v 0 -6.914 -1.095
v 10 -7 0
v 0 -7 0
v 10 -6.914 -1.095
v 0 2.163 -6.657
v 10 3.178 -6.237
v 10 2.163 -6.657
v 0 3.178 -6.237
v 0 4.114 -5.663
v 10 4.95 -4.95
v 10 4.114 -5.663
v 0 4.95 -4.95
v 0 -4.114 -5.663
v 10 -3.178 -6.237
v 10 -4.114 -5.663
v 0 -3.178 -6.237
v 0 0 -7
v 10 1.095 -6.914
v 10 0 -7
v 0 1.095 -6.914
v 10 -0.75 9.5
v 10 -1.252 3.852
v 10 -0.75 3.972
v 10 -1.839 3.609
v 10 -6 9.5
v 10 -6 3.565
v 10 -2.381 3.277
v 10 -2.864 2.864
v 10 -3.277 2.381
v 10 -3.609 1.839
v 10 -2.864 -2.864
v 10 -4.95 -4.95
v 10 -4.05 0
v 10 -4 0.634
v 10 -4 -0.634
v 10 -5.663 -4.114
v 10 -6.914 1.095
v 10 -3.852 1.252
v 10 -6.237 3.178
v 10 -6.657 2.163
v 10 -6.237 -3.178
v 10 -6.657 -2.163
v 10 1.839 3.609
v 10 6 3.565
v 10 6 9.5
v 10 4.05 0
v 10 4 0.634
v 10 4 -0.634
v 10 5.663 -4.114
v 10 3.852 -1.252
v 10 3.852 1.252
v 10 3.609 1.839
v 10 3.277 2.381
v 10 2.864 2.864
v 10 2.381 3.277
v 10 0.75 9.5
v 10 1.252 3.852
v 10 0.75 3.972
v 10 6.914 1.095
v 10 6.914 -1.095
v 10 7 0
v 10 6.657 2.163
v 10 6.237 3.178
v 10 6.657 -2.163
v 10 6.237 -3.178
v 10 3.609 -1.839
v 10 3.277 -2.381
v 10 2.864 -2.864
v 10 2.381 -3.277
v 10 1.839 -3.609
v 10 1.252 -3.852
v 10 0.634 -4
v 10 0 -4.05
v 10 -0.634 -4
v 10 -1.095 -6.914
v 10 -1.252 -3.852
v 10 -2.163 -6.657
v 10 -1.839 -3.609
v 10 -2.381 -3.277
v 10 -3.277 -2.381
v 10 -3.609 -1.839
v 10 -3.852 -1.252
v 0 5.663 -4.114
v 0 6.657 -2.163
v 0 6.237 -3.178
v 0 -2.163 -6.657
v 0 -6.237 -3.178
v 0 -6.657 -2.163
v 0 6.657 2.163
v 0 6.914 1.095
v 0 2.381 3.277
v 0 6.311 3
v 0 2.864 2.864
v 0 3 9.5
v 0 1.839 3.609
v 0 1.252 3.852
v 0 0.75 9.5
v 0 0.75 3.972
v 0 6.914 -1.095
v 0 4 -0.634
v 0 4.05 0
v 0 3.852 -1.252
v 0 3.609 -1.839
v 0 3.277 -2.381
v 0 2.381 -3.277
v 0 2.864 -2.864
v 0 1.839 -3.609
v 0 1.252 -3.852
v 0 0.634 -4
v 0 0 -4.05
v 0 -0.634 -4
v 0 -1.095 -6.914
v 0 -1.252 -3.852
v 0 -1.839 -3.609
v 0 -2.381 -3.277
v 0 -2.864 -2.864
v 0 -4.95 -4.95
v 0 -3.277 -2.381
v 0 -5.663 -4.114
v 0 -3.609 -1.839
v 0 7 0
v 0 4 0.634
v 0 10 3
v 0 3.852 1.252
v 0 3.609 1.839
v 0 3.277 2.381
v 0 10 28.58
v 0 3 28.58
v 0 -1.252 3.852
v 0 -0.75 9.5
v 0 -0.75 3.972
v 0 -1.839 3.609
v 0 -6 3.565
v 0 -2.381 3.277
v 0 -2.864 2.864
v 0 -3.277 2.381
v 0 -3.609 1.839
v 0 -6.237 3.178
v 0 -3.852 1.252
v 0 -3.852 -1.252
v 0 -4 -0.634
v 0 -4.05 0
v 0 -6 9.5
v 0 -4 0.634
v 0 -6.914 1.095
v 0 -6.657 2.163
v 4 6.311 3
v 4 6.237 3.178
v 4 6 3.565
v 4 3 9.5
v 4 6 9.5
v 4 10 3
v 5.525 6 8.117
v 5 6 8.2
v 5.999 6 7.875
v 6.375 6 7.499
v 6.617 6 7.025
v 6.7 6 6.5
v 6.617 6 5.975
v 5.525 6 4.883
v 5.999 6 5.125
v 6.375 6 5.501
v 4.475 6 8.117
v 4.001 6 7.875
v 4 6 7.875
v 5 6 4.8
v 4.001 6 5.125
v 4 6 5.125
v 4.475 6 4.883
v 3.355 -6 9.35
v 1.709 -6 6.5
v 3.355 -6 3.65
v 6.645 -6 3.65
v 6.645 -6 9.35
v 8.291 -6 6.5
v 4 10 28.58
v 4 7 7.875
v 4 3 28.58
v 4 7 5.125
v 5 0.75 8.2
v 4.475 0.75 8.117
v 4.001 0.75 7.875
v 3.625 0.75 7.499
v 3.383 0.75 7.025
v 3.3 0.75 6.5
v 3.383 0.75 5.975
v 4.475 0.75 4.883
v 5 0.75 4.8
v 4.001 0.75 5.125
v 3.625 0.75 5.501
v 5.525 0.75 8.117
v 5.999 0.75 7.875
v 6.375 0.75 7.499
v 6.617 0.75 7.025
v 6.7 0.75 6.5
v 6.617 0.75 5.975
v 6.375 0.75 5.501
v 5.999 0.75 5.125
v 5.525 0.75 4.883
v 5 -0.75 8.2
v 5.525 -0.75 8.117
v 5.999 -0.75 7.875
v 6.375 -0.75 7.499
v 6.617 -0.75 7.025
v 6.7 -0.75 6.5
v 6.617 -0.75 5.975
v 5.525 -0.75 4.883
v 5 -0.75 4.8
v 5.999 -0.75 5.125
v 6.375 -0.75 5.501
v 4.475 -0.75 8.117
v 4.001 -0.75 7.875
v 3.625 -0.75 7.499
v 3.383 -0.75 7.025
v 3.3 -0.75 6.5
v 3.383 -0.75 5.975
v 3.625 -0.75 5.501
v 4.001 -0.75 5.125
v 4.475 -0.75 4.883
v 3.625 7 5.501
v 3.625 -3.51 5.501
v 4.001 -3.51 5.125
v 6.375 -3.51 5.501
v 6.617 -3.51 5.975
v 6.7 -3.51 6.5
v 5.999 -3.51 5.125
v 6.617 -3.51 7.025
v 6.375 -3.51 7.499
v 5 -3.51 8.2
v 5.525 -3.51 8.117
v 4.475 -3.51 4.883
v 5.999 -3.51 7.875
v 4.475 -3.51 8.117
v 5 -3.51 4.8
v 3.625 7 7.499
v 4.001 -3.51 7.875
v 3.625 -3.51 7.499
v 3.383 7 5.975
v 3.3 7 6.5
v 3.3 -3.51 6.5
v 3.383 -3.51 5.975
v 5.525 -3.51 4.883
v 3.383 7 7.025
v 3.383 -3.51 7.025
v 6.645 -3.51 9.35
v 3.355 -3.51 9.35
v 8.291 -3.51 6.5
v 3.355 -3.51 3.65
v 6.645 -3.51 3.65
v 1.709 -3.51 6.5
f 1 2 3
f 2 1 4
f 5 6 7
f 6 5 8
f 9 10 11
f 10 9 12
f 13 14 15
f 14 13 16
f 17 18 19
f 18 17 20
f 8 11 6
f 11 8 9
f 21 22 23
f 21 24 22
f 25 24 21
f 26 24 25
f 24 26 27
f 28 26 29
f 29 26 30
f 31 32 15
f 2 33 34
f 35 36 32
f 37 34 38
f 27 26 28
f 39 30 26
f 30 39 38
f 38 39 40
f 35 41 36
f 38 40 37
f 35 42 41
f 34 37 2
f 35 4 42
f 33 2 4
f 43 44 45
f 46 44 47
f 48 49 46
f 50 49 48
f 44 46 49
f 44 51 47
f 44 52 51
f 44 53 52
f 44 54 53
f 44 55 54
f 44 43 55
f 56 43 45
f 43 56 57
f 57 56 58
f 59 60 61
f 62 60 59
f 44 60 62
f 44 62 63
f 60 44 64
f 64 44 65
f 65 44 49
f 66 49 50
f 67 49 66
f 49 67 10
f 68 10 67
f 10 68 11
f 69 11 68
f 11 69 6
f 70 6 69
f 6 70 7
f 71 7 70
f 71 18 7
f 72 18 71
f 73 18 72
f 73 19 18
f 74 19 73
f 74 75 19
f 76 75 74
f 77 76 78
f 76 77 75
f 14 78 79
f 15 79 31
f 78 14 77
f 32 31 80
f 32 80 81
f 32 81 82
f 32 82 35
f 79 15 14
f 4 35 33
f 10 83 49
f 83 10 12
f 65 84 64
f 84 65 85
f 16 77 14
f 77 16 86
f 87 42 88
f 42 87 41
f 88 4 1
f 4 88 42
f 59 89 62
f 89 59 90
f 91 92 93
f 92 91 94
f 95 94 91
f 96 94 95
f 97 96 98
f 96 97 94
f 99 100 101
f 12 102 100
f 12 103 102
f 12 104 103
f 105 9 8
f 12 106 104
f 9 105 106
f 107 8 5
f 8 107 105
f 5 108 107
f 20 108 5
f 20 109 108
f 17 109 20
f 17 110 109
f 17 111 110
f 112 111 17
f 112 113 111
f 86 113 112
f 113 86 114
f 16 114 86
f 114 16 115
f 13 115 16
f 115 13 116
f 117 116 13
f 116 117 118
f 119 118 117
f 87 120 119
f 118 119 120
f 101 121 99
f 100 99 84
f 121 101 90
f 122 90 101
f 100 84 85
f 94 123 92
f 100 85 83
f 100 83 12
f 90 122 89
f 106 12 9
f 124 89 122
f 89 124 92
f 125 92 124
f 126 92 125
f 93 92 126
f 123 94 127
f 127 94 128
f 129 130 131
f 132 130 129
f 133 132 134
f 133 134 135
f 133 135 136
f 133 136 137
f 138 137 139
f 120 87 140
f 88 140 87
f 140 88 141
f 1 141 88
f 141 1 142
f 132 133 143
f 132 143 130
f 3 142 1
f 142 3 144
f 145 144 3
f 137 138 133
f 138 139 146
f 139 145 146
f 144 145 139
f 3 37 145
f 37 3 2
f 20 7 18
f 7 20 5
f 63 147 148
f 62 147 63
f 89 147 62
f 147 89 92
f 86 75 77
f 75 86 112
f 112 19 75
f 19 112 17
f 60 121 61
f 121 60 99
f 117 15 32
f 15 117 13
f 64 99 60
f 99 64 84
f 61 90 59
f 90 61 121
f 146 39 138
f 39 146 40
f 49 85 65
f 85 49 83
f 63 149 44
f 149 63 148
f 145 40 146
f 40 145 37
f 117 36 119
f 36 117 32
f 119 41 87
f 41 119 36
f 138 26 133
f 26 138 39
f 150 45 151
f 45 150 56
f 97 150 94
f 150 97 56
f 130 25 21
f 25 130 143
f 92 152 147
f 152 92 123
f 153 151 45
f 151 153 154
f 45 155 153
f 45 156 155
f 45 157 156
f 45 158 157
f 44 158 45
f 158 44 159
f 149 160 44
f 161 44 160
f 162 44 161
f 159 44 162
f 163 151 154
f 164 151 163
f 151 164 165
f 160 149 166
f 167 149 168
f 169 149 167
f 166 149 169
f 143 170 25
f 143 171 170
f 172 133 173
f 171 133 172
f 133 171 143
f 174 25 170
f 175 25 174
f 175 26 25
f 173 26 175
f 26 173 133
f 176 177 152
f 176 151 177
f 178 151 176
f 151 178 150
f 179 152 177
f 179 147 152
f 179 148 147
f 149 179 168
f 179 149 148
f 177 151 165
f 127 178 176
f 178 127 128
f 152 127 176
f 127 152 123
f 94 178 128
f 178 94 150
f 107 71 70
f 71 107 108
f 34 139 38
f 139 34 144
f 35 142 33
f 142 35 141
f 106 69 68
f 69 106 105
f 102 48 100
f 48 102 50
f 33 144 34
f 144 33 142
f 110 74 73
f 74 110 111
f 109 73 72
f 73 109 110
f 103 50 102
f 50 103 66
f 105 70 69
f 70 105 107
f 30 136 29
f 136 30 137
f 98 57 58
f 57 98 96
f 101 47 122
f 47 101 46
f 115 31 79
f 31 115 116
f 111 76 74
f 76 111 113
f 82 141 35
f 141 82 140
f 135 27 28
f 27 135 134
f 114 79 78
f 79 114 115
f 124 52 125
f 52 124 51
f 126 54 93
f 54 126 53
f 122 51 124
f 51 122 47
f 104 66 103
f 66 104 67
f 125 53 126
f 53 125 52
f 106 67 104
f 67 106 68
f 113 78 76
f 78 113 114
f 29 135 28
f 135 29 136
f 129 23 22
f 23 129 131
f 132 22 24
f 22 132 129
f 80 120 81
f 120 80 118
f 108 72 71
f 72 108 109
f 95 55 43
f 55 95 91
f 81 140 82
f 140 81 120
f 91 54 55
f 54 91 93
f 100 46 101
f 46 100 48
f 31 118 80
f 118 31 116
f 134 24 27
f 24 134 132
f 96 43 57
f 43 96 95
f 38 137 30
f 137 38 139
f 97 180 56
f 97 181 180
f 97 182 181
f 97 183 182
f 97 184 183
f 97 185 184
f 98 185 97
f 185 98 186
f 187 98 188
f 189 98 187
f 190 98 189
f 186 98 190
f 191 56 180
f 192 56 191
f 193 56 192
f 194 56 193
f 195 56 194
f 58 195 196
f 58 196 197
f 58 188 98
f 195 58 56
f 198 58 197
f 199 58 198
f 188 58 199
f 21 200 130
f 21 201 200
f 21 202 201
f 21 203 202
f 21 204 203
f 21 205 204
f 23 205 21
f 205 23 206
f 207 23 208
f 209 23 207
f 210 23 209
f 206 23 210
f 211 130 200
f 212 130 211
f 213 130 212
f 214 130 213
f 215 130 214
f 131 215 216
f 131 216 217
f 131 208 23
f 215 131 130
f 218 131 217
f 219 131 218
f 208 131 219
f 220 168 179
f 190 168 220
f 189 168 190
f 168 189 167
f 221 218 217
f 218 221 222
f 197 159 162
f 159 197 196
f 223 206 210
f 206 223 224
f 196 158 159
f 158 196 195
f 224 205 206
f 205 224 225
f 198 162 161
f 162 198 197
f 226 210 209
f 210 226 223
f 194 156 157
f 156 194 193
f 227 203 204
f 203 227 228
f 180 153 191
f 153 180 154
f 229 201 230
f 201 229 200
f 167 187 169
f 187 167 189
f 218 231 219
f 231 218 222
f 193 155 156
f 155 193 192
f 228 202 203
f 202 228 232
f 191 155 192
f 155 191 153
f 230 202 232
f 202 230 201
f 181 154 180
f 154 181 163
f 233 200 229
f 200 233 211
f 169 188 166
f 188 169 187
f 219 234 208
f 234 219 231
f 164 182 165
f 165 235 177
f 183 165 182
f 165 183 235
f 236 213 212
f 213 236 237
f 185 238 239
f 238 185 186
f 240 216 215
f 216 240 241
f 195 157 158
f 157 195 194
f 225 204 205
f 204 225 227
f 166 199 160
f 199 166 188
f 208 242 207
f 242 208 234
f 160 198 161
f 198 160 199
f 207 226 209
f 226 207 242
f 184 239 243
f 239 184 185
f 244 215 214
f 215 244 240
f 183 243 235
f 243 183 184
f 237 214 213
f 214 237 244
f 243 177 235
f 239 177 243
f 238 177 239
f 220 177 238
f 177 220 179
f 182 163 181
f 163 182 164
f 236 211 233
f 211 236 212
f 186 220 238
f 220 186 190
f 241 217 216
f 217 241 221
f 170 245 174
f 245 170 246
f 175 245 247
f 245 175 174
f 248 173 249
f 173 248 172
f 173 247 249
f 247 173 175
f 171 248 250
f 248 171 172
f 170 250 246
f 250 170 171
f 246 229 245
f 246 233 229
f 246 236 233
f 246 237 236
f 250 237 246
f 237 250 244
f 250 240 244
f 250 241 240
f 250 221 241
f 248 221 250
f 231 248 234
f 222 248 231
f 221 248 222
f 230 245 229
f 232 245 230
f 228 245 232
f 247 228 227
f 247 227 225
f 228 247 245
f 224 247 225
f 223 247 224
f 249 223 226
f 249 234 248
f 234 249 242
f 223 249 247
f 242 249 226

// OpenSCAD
// H11_beta_stop  (qty 2; frame: local; MJF PA12; print service OK)
// GENERATED by gen_halo_stl.py from halo_parts.py. Change numbers in halo_params.scad.
// Every dimension below is an expression of the names in halo_params.scad.
include <../halo_params.scad>

difference() {
    union() {
        rotate([0, 90, 0]) {
            cylinder(h = 10, r = 7, center = false, $fn = 40);
        }
        translate([0, -6, 3]) {
            cube([10, 12, 6.5], center = false);
        }
        translate([0, 3, 3]) {
            cube([4, 7, R_SI + 12 - (R_BAIL * cos(CH_DEG / 2)) - 3], center = false);
        }
    }
    translate([-1, 0, 0]) {
        rotate([0, 90, 0]) {
            cylinder(h = 12, r = 4.05, center = false, $fn = 40);
        }
    }
    translate([-1, -0.75, 0]) {
        cube([12, 1.5, 9.6], center = false);
    }
    translate([5, -7, 6.5]) {
        rotate([-90, 0, 0]) {
            cylinder(h = 14, r = M3_CLEAR / 2, center = false, $fn = 20);
        }
    }
    translate([5, -6.01, 6.5]) {
        rotate([-90, 0, 0]) {
            cylinder(h = 2.5, r = (M3_NUT_AF + 0.2) / 1.732051, center = false, $fn = 6);
        }
    }
}
